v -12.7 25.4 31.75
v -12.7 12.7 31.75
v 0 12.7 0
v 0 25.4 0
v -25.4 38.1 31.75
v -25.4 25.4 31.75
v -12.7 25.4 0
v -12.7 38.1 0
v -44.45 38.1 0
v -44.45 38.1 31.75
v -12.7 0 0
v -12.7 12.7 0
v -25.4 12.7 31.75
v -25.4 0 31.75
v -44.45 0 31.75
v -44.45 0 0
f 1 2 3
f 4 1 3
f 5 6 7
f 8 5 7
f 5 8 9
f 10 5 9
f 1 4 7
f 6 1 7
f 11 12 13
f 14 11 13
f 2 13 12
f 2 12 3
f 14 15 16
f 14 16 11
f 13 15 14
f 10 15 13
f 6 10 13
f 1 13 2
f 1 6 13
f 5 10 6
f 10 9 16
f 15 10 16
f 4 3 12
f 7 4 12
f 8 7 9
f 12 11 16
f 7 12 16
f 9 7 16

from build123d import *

# Parameters (mm, degrees)
F1_DEPTH = 31.75
F3_DEPTH = 25.401
F5_DEPTH = 12.7
F7_DEPTH = 12.7


# Not quite as in the source:
# - a length typed as a fraction of an inch, garbled in the dataset ("3 / 203.2 mm" for 3/8 in), is restored


with BuildPart() as f1:
    # F0 (on Top) → F1 (new body)
    with BuildSketch(Plane.XY):
        Polygon((-25.4, 38.1), (-44.45, 38.1), (-44.45, 0), (-25.4, 0), (-25.4, 12.7), (0, 12.7), (0, 25.4), (-25.4, 25.4), align=None)
    extrude(amount=F1_DEPTH)

    # F2 (on face) → F3 (cut, through all)
    with BuildSketch(Plane.XZ.offset(-12.7)):
        Polygon((0, 31.75), (-12.7, 31.75), (0, 0), align=None)
    extrude(amount=-F3_DEPTH, mode=Mode.SUBTRACT)

    # F4 (on face) → F5 (join)
    with BuildSketch(Plane.XZ.offset(-12.7)):
        Polygon((-12.7, 0), (-25.4, 31.75), (-25.4, 0), align=None)
    extrude(amount=F5_DEPTH)

    # F6 (on face) → F7 (join)
    with BuildSketch(Plane(origin=(0, 25.4, 0), x_dir=(-1, 0, 0), z_dir=(0, 1, 0))):
        Polygon((25.4, 0), (25.4, 31.75), (12.7, 0), align=None)
    extrude(amount=F7_DEPTH)


solid = f1.part
